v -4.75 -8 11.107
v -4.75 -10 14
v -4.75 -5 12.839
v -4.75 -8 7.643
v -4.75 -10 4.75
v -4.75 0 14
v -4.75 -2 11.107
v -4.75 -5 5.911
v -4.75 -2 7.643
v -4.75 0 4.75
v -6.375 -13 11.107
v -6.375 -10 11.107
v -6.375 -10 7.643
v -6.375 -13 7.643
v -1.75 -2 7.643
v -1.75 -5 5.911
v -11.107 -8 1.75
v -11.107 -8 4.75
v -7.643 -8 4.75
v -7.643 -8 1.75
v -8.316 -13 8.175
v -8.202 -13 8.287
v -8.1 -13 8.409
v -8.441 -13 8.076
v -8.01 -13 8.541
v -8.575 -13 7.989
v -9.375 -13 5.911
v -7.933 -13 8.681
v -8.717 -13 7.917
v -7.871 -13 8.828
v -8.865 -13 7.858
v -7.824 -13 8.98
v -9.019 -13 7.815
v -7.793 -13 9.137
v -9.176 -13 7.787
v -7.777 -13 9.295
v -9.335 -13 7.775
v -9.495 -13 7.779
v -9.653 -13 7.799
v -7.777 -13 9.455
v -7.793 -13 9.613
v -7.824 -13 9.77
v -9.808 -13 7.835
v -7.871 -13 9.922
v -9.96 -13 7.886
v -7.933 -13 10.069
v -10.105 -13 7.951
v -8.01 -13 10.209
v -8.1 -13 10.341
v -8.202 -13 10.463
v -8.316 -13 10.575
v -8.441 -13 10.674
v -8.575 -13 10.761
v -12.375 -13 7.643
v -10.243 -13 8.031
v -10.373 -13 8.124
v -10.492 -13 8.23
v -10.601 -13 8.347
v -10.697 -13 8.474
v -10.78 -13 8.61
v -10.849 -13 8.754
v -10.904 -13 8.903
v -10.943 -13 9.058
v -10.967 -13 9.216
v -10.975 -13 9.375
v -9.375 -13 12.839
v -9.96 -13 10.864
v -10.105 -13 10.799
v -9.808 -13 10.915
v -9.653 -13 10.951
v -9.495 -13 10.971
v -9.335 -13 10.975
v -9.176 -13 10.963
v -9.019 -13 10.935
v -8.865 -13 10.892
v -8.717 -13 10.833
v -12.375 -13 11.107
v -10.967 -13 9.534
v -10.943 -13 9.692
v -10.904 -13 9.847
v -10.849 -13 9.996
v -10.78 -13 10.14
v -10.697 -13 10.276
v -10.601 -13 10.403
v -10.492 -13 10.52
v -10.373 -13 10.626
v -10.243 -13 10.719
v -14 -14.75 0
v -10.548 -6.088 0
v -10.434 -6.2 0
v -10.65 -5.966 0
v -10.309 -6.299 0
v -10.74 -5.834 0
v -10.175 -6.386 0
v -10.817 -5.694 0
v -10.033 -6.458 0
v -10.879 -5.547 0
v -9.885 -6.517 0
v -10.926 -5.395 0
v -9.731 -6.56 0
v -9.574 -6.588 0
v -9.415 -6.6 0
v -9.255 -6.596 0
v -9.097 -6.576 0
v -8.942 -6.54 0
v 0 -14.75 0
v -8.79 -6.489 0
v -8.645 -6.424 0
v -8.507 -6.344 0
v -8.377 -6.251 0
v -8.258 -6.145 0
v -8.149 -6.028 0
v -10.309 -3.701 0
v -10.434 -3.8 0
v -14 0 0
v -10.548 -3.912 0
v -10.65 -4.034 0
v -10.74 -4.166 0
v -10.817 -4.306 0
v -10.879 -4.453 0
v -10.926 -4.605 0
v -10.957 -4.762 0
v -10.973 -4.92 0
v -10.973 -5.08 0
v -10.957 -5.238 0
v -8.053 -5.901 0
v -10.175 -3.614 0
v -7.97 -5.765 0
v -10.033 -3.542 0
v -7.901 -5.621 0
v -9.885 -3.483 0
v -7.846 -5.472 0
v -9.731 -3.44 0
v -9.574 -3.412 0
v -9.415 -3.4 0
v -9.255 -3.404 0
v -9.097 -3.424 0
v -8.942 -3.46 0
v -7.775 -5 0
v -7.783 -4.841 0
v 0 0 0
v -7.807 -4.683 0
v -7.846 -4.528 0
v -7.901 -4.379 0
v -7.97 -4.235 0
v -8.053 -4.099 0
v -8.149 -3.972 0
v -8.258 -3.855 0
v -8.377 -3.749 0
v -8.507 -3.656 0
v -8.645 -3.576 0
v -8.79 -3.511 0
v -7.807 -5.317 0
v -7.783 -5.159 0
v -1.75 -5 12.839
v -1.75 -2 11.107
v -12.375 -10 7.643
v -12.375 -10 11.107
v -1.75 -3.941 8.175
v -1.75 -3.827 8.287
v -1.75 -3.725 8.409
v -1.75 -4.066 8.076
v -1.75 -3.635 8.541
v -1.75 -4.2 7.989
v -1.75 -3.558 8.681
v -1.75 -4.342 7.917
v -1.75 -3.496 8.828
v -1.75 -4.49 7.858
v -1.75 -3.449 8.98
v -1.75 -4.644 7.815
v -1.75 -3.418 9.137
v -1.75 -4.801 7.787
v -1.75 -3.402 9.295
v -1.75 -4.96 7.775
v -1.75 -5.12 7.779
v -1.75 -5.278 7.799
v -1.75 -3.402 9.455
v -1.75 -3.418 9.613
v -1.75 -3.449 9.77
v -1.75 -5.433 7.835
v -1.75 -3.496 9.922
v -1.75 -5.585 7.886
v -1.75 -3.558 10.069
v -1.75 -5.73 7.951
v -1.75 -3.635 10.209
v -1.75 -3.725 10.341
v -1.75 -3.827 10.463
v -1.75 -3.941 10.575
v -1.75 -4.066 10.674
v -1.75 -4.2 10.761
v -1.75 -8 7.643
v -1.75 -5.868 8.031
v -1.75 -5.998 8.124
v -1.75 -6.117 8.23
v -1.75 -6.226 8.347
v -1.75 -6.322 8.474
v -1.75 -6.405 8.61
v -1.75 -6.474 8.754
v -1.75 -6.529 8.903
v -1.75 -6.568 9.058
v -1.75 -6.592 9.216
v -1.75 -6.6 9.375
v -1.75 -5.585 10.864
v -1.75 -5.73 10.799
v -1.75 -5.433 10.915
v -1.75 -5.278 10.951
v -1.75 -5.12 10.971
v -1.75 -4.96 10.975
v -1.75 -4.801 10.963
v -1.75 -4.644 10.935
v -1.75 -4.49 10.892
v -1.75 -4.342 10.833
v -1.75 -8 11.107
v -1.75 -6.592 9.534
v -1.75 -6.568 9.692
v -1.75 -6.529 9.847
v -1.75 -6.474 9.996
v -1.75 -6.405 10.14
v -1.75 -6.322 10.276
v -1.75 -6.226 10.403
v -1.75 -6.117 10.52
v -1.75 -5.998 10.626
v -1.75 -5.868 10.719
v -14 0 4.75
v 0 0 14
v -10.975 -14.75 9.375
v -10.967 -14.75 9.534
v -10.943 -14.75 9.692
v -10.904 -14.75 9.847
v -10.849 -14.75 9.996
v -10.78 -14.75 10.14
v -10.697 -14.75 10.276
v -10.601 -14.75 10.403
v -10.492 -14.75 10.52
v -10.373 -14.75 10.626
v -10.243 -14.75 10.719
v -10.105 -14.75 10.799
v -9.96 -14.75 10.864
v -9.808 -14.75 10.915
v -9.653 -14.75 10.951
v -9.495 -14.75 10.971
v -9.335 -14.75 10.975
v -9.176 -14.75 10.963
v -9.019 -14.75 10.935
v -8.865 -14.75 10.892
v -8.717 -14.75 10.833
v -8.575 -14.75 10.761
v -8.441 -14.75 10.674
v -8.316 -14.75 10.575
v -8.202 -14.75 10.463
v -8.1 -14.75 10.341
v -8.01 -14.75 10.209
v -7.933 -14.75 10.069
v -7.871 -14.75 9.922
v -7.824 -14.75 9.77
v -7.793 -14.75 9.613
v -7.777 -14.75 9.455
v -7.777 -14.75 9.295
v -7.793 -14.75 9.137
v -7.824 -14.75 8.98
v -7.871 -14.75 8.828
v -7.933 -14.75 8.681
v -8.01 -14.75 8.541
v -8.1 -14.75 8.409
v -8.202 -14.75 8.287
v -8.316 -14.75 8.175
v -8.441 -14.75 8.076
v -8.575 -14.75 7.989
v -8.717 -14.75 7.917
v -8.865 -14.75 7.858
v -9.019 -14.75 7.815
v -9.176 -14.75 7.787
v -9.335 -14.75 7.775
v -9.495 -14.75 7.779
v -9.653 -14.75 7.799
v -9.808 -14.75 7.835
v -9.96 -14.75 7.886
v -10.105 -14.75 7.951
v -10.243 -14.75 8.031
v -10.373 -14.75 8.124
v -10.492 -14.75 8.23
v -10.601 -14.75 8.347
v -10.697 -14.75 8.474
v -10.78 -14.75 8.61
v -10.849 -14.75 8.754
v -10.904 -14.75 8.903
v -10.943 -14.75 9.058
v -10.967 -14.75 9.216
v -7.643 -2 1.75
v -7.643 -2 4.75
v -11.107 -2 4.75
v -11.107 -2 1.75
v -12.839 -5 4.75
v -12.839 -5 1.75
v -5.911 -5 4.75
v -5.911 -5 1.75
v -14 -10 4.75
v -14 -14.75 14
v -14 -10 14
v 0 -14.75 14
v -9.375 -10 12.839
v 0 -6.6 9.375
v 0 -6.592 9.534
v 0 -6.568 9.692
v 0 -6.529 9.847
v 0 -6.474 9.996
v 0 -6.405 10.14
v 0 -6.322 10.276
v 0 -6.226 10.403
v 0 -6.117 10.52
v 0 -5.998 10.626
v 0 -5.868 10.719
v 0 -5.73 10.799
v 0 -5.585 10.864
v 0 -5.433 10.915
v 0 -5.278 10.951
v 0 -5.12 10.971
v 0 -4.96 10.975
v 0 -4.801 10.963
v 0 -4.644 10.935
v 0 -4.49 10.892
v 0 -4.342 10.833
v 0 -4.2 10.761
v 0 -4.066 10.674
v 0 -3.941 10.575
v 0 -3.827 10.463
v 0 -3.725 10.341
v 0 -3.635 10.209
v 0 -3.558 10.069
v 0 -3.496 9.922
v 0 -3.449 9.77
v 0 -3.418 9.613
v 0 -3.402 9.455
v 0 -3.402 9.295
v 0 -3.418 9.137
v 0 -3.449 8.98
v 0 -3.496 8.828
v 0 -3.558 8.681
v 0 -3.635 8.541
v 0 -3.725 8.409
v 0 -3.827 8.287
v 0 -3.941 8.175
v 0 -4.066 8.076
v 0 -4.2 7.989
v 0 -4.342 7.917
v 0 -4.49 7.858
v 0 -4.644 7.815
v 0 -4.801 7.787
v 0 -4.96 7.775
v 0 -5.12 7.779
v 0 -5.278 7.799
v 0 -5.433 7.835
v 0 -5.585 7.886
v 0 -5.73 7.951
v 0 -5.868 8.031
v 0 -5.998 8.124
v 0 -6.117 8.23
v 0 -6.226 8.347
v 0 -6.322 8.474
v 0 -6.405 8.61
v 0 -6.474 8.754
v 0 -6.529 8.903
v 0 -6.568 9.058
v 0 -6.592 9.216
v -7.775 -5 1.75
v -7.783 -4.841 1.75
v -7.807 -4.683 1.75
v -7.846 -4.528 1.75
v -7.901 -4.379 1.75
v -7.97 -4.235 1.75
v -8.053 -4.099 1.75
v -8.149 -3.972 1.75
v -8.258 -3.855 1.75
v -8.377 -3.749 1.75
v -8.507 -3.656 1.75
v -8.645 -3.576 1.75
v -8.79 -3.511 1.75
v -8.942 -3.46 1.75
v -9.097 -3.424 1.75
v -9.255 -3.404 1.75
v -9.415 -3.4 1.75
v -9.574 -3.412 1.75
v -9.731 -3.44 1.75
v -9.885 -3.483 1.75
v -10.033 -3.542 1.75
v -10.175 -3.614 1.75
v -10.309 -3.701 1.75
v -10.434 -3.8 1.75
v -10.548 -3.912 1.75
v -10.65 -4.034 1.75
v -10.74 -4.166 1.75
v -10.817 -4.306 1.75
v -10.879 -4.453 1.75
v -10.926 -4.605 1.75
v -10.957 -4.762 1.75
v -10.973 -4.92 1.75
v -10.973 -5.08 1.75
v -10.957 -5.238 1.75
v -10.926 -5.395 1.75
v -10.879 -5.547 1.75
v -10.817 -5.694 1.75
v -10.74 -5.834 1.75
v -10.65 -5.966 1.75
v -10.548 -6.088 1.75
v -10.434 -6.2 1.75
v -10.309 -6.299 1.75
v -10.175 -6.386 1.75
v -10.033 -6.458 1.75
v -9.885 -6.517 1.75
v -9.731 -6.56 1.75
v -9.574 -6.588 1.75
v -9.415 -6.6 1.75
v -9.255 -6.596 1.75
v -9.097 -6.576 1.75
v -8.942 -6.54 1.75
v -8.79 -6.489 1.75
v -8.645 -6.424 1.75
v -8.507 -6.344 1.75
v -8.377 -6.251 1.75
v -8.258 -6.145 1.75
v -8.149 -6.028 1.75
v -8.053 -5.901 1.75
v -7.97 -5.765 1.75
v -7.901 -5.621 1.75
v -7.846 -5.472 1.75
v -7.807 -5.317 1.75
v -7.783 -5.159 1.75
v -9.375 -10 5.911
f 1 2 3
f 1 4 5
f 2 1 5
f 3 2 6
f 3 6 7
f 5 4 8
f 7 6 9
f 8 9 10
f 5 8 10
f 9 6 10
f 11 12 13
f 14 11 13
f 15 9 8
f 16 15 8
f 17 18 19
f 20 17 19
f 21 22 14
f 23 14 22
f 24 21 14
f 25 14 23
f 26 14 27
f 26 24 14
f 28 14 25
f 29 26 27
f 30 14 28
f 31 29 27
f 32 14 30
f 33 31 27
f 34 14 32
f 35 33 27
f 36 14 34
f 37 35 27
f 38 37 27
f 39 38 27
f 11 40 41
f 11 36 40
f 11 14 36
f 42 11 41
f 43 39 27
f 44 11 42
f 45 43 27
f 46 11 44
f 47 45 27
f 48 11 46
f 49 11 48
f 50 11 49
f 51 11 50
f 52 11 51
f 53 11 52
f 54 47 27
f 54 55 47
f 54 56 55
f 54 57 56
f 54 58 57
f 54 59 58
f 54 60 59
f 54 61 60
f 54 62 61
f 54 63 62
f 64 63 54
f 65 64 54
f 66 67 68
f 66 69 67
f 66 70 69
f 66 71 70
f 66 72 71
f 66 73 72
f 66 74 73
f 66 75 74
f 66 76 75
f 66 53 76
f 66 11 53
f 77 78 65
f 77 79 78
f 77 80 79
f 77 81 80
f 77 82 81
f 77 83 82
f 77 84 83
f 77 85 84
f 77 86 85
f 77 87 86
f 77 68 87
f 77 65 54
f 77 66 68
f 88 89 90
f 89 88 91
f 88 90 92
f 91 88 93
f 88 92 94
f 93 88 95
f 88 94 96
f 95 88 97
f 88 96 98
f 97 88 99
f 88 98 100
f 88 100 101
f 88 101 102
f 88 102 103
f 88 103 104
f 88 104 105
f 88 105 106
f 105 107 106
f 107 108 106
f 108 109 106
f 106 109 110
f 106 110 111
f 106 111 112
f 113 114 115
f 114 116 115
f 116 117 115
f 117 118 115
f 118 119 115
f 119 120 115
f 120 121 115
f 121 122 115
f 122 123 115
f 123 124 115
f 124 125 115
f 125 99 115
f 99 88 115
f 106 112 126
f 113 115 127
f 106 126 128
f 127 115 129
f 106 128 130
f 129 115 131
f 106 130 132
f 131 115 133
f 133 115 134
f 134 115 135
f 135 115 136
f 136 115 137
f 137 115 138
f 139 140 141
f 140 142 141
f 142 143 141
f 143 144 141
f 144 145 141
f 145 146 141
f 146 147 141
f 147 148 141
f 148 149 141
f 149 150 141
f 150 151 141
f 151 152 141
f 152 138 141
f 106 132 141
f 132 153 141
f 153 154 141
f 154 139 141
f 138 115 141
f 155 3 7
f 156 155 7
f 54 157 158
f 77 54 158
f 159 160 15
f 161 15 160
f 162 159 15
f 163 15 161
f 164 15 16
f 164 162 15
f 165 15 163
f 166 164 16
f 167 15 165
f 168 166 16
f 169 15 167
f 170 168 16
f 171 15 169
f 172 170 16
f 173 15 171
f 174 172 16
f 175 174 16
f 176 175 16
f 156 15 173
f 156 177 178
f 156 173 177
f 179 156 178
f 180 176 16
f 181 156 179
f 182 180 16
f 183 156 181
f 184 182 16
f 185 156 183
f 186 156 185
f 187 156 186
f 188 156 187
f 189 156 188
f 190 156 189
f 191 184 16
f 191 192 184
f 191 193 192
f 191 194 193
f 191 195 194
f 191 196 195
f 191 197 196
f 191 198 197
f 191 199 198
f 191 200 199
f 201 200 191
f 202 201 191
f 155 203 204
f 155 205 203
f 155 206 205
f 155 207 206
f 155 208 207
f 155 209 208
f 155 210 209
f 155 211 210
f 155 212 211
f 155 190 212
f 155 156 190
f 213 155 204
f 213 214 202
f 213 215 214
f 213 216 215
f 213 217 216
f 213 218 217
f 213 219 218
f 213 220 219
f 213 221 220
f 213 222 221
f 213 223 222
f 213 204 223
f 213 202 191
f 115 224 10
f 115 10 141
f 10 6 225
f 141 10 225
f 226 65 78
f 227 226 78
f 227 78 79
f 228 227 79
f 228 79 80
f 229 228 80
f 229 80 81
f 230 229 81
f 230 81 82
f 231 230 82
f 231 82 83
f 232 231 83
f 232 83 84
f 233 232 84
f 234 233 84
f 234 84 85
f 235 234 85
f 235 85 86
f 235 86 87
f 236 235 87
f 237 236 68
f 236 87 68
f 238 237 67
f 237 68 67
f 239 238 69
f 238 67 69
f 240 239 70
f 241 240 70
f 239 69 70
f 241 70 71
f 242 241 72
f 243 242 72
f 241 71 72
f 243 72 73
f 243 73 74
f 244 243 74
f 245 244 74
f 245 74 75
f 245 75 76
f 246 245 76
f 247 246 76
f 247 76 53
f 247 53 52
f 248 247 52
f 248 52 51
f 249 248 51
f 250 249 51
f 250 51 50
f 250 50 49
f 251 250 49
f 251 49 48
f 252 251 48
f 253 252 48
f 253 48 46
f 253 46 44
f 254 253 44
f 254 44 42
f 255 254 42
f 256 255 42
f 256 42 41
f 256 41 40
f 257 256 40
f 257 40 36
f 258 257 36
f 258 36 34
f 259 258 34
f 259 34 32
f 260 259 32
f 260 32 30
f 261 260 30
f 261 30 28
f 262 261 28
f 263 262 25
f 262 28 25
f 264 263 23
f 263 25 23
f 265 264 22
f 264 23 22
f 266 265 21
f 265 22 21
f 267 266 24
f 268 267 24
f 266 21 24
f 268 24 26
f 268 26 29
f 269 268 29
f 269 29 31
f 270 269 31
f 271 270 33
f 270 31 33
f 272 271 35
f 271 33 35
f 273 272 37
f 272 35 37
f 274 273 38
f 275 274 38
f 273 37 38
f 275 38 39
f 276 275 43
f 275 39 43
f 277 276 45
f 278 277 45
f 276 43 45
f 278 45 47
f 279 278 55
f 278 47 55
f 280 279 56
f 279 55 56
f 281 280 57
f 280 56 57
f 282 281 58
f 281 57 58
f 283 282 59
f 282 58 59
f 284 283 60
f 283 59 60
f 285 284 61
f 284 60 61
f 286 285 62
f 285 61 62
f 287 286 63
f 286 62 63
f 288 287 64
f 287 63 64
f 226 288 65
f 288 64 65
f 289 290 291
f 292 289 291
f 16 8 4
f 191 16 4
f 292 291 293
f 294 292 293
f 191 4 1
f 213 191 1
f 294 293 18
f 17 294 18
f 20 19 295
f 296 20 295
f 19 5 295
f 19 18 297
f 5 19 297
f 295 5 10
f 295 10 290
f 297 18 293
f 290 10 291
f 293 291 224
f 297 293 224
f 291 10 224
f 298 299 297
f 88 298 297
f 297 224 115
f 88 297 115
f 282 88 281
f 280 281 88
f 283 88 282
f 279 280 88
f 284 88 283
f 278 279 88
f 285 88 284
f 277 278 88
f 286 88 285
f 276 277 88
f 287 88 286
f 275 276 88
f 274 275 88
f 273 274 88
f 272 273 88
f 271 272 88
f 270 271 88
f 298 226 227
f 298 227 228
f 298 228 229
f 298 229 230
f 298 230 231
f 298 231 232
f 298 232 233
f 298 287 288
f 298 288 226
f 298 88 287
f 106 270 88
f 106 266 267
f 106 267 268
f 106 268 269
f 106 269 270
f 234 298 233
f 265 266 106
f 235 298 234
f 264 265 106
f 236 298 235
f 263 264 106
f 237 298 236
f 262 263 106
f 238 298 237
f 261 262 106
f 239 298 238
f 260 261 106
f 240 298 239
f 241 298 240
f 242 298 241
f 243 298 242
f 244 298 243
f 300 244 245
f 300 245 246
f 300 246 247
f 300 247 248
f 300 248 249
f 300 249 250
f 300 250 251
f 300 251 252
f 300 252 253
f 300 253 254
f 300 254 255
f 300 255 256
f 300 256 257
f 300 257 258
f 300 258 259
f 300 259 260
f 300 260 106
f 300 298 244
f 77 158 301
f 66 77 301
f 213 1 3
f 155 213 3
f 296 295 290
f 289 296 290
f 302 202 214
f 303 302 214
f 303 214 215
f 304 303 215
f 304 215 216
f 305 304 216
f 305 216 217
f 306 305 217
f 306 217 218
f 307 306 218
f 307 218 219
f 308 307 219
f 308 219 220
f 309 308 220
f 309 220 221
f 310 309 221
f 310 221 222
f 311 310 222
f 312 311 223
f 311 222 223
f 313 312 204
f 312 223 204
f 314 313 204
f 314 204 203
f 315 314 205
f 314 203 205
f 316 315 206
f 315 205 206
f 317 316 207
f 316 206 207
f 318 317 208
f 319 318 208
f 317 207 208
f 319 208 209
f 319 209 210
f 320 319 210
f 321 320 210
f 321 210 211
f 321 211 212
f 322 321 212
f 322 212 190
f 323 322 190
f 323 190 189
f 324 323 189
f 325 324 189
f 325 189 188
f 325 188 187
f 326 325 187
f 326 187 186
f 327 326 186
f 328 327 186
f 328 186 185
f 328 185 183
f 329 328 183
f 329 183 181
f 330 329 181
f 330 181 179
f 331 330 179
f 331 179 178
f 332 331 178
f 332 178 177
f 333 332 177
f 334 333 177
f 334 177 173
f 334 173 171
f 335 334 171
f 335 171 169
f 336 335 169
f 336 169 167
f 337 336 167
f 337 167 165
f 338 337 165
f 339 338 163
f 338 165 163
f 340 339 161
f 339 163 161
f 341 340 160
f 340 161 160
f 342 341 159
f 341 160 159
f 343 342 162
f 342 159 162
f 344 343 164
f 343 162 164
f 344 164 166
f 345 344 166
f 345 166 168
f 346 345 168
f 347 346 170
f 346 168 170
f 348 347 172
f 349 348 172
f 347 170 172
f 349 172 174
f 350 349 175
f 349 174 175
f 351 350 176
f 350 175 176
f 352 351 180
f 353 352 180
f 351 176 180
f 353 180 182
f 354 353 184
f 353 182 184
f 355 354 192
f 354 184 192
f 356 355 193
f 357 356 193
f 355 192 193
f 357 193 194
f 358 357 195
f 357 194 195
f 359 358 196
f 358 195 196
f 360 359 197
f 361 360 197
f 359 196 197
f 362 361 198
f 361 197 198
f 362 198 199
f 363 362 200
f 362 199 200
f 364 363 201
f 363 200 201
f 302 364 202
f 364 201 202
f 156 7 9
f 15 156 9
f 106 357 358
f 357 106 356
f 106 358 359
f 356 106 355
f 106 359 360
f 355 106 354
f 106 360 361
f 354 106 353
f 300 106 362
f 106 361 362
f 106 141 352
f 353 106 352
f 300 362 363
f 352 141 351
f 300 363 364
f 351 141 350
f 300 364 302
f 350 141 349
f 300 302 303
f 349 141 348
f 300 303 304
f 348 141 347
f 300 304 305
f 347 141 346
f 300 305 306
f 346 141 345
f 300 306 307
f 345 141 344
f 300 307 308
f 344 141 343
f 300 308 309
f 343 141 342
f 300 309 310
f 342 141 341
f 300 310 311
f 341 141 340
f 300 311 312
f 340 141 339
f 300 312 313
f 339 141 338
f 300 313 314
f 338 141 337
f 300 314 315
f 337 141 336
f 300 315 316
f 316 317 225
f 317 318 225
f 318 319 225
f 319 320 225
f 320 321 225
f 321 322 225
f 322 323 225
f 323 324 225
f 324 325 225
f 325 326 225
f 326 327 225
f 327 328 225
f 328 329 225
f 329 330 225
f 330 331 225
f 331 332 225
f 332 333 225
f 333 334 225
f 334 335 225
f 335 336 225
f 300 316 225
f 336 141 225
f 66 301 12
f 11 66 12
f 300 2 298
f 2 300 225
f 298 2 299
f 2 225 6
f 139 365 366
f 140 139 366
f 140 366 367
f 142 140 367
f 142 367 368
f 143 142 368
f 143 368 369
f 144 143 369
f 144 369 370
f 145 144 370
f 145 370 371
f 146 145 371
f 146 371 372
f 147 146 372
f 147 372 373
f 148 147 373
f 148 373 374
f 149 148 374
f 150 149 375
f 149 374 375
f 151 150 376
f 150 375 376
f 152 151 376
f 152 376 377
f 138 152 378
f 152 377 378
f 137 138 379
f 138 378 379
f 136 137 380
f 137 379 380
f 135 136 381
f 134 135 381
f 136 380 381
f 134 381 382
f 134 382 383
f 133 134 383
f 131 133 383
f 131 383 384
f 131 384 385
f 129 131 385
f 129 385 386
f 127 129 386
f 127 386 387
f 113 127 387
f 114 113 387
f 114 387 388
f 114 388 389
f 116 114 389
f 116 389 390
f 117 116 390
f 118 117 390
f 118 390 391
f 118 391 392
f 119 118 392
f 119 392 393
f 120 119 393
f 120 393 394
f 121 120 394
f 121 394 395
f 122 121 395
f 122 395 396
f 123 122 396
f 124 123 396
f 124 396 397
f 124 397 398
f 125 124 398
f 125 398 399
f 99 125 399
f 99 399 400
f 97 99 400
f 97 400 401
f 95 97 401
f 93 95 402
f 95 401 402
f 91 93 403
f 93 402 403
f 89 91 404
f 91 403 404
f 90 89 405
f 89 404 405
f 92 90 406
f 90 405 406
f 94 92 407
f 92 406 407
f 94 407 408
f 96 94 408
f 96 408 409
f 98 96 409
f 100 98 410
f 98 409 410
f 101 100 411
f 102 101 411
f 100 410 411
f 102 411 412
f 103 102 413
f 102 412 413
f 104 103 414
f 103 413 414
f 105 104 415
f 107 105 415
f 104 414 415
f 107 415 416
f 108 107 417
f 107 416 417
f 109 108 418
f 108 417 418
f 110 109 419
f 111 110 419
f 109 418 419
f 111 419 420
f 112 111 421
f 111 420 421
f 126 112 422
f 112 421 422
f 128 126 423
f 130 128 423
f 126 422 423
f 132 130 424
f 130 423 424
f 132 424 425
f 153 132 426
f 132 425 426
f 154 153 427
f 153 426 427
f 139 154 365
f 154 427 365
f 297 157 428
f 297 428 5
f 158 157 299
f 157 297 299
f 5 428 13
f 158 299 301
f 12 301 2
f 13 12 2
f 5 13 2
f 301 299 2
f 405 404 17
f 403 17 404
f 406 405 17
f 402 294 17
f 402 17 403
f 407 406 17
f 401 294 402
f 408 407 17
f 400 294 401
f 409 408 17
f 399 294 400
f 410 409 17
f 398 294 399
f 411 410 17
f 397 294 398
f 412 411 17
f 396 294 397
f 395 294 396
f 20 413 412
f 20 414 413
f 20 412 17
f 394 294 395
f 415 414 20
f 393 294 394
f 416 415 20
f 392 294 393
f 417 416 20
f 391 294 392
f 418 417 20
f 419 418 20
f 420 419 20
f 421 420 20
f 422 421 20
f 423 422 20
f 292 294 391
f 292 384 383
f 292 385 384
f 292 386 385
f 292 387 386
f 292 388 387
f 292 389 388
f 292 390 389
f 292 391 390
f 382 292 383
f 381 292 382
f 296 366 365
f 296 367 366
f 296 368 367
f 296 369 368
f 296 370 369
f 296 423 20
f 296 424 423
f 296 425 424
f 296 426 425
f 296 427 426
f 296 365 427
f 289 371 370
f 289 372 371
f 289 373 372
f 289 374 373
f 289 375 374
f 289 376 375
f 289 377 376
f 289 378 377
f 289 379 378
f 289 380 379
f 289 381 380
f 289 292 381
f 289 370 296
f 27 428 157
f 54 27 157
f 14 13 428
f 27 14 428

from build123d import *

# Parameters (mm, degrees)
F1_DEPTH  = 10
F2_R      = 1.6
F3_DEPTH  = 3
F4_DEPTH  = 25
F5_R      = 1.6
F6_DEPTH  = 3
F7_DEPTH  = 25
F8_W      = 9.25
F8_H      = 9.25
F9_DEPTH  = 4.75
F10_R     = 1.6
F11_DEPTH = 3
F12_DEPTH = 25


with BuildPart() as f1:
    # F0 (on Front) → F1 (new body)
    with BuildSketch(Plane.XZ):
        Polygon((-14, 0), (0, 0), (0, 14), (-4.75, 14), (-4.75, 4.75), (-14, 4.75), align=None)
    extrude(amount=F1_DEPTH)

    # F2 (on face) → F3 (cut)
    with BuildSketch(Plane(origin=(-4.75, 0, 0), x_dir=(0, -1, 0), z_dir=(-1, 0, 0))):
        Polygon((2, 11.1070508076), (2, 7.6429491924), (5, 5.9108983849), (8, 7.6429491924), (8, 11.1070508076), (5, 12.8391016151), align=None)
        with Locations((5, 9.375)):
            Circle(F2_R, mode=Mode.SUBTRACT)
    extrude(amount=-F3_DEPTH, mode=Mode.SUBTRACT)

    # F4 (cut): a face of the model
    f4_faces = [f1.faces().sort_by_distance(p)[0] for p in [
        (-4.75, -5, 9.375),
    ]]
    extrude(f4_faces, amount=-F4_DEPTH, mode=Mode.SUBTRACT)

    # F5 (on face) → F6 (cut)
    with BuildSketch(Plane.XY.offset(4.75)):
        Polygon((-11.1070508076, -8), (-7.6429491924, -8), (-5.9108983849, -5), (-7.6429491924, -2), (-11.1070508076, -2), (-12.8391016151, -5), align=None)
        with Locations((-9.375, -5)):
            Circle(F5_R, mode=Mode.SUBTRACT)
    extrude(amount=-F6_DEPTH, mode=Mode.SUBTRACT)

    # F7 (cut): a face of the model
    f7_faces = [f1.faces().sort_by_distance(p)[0] for p in [
        (-9.375, -5, 4.75),
    ]]
    extrude(f7_faces, amount=-F7_DEPTH, mode=Mode.SUBTRACT)

    # F8 (on face) → F9 (join)
    with BuildSketch(Plane.XZ.offset(10)):
        with Locations((-9.375, 9.375)):
            Rectangle(F8_W, F8_H)
        Polygon((-14, 0), (0, 0), (0, 14), (-4.75, 14), (-4.75, 4.75), (-14, 4.75), align=None)
    extrude(amount=F9_DEPTH)

    # F10 (on face) → F11 (cut)
    with BuildSketch(Plane(origin=(0, -10, 0), x_dir=(-1, 0, 0), z_dir=(0, 1, 0))):
        Polygon((6.375, 11.1070508076), (6.375, 7.6429491924), (9.375, 5.9108983849), (12.375, 7.6429491924), (12.375, 11.1070508076), (9.375, 12.8391016151), align=None)
        with Locations((9.375, 9.375)):
            Circle(F10_R, mode=Mode.SUBTRACT)
    extrude(amount=-F11_DEPTH, mode=Mode.SUBTRACT)

    # F12 (cut): a face of the model
    f12_faces = [f1.faces().sort_by_distance(p)[0] for p in [
        (-9.375, -10, 9.375),
    ]]
    extrude(f12_faces, amount=-F12_DEPTH, mode=Mode.SUBTRACT)


solid = f1.part
